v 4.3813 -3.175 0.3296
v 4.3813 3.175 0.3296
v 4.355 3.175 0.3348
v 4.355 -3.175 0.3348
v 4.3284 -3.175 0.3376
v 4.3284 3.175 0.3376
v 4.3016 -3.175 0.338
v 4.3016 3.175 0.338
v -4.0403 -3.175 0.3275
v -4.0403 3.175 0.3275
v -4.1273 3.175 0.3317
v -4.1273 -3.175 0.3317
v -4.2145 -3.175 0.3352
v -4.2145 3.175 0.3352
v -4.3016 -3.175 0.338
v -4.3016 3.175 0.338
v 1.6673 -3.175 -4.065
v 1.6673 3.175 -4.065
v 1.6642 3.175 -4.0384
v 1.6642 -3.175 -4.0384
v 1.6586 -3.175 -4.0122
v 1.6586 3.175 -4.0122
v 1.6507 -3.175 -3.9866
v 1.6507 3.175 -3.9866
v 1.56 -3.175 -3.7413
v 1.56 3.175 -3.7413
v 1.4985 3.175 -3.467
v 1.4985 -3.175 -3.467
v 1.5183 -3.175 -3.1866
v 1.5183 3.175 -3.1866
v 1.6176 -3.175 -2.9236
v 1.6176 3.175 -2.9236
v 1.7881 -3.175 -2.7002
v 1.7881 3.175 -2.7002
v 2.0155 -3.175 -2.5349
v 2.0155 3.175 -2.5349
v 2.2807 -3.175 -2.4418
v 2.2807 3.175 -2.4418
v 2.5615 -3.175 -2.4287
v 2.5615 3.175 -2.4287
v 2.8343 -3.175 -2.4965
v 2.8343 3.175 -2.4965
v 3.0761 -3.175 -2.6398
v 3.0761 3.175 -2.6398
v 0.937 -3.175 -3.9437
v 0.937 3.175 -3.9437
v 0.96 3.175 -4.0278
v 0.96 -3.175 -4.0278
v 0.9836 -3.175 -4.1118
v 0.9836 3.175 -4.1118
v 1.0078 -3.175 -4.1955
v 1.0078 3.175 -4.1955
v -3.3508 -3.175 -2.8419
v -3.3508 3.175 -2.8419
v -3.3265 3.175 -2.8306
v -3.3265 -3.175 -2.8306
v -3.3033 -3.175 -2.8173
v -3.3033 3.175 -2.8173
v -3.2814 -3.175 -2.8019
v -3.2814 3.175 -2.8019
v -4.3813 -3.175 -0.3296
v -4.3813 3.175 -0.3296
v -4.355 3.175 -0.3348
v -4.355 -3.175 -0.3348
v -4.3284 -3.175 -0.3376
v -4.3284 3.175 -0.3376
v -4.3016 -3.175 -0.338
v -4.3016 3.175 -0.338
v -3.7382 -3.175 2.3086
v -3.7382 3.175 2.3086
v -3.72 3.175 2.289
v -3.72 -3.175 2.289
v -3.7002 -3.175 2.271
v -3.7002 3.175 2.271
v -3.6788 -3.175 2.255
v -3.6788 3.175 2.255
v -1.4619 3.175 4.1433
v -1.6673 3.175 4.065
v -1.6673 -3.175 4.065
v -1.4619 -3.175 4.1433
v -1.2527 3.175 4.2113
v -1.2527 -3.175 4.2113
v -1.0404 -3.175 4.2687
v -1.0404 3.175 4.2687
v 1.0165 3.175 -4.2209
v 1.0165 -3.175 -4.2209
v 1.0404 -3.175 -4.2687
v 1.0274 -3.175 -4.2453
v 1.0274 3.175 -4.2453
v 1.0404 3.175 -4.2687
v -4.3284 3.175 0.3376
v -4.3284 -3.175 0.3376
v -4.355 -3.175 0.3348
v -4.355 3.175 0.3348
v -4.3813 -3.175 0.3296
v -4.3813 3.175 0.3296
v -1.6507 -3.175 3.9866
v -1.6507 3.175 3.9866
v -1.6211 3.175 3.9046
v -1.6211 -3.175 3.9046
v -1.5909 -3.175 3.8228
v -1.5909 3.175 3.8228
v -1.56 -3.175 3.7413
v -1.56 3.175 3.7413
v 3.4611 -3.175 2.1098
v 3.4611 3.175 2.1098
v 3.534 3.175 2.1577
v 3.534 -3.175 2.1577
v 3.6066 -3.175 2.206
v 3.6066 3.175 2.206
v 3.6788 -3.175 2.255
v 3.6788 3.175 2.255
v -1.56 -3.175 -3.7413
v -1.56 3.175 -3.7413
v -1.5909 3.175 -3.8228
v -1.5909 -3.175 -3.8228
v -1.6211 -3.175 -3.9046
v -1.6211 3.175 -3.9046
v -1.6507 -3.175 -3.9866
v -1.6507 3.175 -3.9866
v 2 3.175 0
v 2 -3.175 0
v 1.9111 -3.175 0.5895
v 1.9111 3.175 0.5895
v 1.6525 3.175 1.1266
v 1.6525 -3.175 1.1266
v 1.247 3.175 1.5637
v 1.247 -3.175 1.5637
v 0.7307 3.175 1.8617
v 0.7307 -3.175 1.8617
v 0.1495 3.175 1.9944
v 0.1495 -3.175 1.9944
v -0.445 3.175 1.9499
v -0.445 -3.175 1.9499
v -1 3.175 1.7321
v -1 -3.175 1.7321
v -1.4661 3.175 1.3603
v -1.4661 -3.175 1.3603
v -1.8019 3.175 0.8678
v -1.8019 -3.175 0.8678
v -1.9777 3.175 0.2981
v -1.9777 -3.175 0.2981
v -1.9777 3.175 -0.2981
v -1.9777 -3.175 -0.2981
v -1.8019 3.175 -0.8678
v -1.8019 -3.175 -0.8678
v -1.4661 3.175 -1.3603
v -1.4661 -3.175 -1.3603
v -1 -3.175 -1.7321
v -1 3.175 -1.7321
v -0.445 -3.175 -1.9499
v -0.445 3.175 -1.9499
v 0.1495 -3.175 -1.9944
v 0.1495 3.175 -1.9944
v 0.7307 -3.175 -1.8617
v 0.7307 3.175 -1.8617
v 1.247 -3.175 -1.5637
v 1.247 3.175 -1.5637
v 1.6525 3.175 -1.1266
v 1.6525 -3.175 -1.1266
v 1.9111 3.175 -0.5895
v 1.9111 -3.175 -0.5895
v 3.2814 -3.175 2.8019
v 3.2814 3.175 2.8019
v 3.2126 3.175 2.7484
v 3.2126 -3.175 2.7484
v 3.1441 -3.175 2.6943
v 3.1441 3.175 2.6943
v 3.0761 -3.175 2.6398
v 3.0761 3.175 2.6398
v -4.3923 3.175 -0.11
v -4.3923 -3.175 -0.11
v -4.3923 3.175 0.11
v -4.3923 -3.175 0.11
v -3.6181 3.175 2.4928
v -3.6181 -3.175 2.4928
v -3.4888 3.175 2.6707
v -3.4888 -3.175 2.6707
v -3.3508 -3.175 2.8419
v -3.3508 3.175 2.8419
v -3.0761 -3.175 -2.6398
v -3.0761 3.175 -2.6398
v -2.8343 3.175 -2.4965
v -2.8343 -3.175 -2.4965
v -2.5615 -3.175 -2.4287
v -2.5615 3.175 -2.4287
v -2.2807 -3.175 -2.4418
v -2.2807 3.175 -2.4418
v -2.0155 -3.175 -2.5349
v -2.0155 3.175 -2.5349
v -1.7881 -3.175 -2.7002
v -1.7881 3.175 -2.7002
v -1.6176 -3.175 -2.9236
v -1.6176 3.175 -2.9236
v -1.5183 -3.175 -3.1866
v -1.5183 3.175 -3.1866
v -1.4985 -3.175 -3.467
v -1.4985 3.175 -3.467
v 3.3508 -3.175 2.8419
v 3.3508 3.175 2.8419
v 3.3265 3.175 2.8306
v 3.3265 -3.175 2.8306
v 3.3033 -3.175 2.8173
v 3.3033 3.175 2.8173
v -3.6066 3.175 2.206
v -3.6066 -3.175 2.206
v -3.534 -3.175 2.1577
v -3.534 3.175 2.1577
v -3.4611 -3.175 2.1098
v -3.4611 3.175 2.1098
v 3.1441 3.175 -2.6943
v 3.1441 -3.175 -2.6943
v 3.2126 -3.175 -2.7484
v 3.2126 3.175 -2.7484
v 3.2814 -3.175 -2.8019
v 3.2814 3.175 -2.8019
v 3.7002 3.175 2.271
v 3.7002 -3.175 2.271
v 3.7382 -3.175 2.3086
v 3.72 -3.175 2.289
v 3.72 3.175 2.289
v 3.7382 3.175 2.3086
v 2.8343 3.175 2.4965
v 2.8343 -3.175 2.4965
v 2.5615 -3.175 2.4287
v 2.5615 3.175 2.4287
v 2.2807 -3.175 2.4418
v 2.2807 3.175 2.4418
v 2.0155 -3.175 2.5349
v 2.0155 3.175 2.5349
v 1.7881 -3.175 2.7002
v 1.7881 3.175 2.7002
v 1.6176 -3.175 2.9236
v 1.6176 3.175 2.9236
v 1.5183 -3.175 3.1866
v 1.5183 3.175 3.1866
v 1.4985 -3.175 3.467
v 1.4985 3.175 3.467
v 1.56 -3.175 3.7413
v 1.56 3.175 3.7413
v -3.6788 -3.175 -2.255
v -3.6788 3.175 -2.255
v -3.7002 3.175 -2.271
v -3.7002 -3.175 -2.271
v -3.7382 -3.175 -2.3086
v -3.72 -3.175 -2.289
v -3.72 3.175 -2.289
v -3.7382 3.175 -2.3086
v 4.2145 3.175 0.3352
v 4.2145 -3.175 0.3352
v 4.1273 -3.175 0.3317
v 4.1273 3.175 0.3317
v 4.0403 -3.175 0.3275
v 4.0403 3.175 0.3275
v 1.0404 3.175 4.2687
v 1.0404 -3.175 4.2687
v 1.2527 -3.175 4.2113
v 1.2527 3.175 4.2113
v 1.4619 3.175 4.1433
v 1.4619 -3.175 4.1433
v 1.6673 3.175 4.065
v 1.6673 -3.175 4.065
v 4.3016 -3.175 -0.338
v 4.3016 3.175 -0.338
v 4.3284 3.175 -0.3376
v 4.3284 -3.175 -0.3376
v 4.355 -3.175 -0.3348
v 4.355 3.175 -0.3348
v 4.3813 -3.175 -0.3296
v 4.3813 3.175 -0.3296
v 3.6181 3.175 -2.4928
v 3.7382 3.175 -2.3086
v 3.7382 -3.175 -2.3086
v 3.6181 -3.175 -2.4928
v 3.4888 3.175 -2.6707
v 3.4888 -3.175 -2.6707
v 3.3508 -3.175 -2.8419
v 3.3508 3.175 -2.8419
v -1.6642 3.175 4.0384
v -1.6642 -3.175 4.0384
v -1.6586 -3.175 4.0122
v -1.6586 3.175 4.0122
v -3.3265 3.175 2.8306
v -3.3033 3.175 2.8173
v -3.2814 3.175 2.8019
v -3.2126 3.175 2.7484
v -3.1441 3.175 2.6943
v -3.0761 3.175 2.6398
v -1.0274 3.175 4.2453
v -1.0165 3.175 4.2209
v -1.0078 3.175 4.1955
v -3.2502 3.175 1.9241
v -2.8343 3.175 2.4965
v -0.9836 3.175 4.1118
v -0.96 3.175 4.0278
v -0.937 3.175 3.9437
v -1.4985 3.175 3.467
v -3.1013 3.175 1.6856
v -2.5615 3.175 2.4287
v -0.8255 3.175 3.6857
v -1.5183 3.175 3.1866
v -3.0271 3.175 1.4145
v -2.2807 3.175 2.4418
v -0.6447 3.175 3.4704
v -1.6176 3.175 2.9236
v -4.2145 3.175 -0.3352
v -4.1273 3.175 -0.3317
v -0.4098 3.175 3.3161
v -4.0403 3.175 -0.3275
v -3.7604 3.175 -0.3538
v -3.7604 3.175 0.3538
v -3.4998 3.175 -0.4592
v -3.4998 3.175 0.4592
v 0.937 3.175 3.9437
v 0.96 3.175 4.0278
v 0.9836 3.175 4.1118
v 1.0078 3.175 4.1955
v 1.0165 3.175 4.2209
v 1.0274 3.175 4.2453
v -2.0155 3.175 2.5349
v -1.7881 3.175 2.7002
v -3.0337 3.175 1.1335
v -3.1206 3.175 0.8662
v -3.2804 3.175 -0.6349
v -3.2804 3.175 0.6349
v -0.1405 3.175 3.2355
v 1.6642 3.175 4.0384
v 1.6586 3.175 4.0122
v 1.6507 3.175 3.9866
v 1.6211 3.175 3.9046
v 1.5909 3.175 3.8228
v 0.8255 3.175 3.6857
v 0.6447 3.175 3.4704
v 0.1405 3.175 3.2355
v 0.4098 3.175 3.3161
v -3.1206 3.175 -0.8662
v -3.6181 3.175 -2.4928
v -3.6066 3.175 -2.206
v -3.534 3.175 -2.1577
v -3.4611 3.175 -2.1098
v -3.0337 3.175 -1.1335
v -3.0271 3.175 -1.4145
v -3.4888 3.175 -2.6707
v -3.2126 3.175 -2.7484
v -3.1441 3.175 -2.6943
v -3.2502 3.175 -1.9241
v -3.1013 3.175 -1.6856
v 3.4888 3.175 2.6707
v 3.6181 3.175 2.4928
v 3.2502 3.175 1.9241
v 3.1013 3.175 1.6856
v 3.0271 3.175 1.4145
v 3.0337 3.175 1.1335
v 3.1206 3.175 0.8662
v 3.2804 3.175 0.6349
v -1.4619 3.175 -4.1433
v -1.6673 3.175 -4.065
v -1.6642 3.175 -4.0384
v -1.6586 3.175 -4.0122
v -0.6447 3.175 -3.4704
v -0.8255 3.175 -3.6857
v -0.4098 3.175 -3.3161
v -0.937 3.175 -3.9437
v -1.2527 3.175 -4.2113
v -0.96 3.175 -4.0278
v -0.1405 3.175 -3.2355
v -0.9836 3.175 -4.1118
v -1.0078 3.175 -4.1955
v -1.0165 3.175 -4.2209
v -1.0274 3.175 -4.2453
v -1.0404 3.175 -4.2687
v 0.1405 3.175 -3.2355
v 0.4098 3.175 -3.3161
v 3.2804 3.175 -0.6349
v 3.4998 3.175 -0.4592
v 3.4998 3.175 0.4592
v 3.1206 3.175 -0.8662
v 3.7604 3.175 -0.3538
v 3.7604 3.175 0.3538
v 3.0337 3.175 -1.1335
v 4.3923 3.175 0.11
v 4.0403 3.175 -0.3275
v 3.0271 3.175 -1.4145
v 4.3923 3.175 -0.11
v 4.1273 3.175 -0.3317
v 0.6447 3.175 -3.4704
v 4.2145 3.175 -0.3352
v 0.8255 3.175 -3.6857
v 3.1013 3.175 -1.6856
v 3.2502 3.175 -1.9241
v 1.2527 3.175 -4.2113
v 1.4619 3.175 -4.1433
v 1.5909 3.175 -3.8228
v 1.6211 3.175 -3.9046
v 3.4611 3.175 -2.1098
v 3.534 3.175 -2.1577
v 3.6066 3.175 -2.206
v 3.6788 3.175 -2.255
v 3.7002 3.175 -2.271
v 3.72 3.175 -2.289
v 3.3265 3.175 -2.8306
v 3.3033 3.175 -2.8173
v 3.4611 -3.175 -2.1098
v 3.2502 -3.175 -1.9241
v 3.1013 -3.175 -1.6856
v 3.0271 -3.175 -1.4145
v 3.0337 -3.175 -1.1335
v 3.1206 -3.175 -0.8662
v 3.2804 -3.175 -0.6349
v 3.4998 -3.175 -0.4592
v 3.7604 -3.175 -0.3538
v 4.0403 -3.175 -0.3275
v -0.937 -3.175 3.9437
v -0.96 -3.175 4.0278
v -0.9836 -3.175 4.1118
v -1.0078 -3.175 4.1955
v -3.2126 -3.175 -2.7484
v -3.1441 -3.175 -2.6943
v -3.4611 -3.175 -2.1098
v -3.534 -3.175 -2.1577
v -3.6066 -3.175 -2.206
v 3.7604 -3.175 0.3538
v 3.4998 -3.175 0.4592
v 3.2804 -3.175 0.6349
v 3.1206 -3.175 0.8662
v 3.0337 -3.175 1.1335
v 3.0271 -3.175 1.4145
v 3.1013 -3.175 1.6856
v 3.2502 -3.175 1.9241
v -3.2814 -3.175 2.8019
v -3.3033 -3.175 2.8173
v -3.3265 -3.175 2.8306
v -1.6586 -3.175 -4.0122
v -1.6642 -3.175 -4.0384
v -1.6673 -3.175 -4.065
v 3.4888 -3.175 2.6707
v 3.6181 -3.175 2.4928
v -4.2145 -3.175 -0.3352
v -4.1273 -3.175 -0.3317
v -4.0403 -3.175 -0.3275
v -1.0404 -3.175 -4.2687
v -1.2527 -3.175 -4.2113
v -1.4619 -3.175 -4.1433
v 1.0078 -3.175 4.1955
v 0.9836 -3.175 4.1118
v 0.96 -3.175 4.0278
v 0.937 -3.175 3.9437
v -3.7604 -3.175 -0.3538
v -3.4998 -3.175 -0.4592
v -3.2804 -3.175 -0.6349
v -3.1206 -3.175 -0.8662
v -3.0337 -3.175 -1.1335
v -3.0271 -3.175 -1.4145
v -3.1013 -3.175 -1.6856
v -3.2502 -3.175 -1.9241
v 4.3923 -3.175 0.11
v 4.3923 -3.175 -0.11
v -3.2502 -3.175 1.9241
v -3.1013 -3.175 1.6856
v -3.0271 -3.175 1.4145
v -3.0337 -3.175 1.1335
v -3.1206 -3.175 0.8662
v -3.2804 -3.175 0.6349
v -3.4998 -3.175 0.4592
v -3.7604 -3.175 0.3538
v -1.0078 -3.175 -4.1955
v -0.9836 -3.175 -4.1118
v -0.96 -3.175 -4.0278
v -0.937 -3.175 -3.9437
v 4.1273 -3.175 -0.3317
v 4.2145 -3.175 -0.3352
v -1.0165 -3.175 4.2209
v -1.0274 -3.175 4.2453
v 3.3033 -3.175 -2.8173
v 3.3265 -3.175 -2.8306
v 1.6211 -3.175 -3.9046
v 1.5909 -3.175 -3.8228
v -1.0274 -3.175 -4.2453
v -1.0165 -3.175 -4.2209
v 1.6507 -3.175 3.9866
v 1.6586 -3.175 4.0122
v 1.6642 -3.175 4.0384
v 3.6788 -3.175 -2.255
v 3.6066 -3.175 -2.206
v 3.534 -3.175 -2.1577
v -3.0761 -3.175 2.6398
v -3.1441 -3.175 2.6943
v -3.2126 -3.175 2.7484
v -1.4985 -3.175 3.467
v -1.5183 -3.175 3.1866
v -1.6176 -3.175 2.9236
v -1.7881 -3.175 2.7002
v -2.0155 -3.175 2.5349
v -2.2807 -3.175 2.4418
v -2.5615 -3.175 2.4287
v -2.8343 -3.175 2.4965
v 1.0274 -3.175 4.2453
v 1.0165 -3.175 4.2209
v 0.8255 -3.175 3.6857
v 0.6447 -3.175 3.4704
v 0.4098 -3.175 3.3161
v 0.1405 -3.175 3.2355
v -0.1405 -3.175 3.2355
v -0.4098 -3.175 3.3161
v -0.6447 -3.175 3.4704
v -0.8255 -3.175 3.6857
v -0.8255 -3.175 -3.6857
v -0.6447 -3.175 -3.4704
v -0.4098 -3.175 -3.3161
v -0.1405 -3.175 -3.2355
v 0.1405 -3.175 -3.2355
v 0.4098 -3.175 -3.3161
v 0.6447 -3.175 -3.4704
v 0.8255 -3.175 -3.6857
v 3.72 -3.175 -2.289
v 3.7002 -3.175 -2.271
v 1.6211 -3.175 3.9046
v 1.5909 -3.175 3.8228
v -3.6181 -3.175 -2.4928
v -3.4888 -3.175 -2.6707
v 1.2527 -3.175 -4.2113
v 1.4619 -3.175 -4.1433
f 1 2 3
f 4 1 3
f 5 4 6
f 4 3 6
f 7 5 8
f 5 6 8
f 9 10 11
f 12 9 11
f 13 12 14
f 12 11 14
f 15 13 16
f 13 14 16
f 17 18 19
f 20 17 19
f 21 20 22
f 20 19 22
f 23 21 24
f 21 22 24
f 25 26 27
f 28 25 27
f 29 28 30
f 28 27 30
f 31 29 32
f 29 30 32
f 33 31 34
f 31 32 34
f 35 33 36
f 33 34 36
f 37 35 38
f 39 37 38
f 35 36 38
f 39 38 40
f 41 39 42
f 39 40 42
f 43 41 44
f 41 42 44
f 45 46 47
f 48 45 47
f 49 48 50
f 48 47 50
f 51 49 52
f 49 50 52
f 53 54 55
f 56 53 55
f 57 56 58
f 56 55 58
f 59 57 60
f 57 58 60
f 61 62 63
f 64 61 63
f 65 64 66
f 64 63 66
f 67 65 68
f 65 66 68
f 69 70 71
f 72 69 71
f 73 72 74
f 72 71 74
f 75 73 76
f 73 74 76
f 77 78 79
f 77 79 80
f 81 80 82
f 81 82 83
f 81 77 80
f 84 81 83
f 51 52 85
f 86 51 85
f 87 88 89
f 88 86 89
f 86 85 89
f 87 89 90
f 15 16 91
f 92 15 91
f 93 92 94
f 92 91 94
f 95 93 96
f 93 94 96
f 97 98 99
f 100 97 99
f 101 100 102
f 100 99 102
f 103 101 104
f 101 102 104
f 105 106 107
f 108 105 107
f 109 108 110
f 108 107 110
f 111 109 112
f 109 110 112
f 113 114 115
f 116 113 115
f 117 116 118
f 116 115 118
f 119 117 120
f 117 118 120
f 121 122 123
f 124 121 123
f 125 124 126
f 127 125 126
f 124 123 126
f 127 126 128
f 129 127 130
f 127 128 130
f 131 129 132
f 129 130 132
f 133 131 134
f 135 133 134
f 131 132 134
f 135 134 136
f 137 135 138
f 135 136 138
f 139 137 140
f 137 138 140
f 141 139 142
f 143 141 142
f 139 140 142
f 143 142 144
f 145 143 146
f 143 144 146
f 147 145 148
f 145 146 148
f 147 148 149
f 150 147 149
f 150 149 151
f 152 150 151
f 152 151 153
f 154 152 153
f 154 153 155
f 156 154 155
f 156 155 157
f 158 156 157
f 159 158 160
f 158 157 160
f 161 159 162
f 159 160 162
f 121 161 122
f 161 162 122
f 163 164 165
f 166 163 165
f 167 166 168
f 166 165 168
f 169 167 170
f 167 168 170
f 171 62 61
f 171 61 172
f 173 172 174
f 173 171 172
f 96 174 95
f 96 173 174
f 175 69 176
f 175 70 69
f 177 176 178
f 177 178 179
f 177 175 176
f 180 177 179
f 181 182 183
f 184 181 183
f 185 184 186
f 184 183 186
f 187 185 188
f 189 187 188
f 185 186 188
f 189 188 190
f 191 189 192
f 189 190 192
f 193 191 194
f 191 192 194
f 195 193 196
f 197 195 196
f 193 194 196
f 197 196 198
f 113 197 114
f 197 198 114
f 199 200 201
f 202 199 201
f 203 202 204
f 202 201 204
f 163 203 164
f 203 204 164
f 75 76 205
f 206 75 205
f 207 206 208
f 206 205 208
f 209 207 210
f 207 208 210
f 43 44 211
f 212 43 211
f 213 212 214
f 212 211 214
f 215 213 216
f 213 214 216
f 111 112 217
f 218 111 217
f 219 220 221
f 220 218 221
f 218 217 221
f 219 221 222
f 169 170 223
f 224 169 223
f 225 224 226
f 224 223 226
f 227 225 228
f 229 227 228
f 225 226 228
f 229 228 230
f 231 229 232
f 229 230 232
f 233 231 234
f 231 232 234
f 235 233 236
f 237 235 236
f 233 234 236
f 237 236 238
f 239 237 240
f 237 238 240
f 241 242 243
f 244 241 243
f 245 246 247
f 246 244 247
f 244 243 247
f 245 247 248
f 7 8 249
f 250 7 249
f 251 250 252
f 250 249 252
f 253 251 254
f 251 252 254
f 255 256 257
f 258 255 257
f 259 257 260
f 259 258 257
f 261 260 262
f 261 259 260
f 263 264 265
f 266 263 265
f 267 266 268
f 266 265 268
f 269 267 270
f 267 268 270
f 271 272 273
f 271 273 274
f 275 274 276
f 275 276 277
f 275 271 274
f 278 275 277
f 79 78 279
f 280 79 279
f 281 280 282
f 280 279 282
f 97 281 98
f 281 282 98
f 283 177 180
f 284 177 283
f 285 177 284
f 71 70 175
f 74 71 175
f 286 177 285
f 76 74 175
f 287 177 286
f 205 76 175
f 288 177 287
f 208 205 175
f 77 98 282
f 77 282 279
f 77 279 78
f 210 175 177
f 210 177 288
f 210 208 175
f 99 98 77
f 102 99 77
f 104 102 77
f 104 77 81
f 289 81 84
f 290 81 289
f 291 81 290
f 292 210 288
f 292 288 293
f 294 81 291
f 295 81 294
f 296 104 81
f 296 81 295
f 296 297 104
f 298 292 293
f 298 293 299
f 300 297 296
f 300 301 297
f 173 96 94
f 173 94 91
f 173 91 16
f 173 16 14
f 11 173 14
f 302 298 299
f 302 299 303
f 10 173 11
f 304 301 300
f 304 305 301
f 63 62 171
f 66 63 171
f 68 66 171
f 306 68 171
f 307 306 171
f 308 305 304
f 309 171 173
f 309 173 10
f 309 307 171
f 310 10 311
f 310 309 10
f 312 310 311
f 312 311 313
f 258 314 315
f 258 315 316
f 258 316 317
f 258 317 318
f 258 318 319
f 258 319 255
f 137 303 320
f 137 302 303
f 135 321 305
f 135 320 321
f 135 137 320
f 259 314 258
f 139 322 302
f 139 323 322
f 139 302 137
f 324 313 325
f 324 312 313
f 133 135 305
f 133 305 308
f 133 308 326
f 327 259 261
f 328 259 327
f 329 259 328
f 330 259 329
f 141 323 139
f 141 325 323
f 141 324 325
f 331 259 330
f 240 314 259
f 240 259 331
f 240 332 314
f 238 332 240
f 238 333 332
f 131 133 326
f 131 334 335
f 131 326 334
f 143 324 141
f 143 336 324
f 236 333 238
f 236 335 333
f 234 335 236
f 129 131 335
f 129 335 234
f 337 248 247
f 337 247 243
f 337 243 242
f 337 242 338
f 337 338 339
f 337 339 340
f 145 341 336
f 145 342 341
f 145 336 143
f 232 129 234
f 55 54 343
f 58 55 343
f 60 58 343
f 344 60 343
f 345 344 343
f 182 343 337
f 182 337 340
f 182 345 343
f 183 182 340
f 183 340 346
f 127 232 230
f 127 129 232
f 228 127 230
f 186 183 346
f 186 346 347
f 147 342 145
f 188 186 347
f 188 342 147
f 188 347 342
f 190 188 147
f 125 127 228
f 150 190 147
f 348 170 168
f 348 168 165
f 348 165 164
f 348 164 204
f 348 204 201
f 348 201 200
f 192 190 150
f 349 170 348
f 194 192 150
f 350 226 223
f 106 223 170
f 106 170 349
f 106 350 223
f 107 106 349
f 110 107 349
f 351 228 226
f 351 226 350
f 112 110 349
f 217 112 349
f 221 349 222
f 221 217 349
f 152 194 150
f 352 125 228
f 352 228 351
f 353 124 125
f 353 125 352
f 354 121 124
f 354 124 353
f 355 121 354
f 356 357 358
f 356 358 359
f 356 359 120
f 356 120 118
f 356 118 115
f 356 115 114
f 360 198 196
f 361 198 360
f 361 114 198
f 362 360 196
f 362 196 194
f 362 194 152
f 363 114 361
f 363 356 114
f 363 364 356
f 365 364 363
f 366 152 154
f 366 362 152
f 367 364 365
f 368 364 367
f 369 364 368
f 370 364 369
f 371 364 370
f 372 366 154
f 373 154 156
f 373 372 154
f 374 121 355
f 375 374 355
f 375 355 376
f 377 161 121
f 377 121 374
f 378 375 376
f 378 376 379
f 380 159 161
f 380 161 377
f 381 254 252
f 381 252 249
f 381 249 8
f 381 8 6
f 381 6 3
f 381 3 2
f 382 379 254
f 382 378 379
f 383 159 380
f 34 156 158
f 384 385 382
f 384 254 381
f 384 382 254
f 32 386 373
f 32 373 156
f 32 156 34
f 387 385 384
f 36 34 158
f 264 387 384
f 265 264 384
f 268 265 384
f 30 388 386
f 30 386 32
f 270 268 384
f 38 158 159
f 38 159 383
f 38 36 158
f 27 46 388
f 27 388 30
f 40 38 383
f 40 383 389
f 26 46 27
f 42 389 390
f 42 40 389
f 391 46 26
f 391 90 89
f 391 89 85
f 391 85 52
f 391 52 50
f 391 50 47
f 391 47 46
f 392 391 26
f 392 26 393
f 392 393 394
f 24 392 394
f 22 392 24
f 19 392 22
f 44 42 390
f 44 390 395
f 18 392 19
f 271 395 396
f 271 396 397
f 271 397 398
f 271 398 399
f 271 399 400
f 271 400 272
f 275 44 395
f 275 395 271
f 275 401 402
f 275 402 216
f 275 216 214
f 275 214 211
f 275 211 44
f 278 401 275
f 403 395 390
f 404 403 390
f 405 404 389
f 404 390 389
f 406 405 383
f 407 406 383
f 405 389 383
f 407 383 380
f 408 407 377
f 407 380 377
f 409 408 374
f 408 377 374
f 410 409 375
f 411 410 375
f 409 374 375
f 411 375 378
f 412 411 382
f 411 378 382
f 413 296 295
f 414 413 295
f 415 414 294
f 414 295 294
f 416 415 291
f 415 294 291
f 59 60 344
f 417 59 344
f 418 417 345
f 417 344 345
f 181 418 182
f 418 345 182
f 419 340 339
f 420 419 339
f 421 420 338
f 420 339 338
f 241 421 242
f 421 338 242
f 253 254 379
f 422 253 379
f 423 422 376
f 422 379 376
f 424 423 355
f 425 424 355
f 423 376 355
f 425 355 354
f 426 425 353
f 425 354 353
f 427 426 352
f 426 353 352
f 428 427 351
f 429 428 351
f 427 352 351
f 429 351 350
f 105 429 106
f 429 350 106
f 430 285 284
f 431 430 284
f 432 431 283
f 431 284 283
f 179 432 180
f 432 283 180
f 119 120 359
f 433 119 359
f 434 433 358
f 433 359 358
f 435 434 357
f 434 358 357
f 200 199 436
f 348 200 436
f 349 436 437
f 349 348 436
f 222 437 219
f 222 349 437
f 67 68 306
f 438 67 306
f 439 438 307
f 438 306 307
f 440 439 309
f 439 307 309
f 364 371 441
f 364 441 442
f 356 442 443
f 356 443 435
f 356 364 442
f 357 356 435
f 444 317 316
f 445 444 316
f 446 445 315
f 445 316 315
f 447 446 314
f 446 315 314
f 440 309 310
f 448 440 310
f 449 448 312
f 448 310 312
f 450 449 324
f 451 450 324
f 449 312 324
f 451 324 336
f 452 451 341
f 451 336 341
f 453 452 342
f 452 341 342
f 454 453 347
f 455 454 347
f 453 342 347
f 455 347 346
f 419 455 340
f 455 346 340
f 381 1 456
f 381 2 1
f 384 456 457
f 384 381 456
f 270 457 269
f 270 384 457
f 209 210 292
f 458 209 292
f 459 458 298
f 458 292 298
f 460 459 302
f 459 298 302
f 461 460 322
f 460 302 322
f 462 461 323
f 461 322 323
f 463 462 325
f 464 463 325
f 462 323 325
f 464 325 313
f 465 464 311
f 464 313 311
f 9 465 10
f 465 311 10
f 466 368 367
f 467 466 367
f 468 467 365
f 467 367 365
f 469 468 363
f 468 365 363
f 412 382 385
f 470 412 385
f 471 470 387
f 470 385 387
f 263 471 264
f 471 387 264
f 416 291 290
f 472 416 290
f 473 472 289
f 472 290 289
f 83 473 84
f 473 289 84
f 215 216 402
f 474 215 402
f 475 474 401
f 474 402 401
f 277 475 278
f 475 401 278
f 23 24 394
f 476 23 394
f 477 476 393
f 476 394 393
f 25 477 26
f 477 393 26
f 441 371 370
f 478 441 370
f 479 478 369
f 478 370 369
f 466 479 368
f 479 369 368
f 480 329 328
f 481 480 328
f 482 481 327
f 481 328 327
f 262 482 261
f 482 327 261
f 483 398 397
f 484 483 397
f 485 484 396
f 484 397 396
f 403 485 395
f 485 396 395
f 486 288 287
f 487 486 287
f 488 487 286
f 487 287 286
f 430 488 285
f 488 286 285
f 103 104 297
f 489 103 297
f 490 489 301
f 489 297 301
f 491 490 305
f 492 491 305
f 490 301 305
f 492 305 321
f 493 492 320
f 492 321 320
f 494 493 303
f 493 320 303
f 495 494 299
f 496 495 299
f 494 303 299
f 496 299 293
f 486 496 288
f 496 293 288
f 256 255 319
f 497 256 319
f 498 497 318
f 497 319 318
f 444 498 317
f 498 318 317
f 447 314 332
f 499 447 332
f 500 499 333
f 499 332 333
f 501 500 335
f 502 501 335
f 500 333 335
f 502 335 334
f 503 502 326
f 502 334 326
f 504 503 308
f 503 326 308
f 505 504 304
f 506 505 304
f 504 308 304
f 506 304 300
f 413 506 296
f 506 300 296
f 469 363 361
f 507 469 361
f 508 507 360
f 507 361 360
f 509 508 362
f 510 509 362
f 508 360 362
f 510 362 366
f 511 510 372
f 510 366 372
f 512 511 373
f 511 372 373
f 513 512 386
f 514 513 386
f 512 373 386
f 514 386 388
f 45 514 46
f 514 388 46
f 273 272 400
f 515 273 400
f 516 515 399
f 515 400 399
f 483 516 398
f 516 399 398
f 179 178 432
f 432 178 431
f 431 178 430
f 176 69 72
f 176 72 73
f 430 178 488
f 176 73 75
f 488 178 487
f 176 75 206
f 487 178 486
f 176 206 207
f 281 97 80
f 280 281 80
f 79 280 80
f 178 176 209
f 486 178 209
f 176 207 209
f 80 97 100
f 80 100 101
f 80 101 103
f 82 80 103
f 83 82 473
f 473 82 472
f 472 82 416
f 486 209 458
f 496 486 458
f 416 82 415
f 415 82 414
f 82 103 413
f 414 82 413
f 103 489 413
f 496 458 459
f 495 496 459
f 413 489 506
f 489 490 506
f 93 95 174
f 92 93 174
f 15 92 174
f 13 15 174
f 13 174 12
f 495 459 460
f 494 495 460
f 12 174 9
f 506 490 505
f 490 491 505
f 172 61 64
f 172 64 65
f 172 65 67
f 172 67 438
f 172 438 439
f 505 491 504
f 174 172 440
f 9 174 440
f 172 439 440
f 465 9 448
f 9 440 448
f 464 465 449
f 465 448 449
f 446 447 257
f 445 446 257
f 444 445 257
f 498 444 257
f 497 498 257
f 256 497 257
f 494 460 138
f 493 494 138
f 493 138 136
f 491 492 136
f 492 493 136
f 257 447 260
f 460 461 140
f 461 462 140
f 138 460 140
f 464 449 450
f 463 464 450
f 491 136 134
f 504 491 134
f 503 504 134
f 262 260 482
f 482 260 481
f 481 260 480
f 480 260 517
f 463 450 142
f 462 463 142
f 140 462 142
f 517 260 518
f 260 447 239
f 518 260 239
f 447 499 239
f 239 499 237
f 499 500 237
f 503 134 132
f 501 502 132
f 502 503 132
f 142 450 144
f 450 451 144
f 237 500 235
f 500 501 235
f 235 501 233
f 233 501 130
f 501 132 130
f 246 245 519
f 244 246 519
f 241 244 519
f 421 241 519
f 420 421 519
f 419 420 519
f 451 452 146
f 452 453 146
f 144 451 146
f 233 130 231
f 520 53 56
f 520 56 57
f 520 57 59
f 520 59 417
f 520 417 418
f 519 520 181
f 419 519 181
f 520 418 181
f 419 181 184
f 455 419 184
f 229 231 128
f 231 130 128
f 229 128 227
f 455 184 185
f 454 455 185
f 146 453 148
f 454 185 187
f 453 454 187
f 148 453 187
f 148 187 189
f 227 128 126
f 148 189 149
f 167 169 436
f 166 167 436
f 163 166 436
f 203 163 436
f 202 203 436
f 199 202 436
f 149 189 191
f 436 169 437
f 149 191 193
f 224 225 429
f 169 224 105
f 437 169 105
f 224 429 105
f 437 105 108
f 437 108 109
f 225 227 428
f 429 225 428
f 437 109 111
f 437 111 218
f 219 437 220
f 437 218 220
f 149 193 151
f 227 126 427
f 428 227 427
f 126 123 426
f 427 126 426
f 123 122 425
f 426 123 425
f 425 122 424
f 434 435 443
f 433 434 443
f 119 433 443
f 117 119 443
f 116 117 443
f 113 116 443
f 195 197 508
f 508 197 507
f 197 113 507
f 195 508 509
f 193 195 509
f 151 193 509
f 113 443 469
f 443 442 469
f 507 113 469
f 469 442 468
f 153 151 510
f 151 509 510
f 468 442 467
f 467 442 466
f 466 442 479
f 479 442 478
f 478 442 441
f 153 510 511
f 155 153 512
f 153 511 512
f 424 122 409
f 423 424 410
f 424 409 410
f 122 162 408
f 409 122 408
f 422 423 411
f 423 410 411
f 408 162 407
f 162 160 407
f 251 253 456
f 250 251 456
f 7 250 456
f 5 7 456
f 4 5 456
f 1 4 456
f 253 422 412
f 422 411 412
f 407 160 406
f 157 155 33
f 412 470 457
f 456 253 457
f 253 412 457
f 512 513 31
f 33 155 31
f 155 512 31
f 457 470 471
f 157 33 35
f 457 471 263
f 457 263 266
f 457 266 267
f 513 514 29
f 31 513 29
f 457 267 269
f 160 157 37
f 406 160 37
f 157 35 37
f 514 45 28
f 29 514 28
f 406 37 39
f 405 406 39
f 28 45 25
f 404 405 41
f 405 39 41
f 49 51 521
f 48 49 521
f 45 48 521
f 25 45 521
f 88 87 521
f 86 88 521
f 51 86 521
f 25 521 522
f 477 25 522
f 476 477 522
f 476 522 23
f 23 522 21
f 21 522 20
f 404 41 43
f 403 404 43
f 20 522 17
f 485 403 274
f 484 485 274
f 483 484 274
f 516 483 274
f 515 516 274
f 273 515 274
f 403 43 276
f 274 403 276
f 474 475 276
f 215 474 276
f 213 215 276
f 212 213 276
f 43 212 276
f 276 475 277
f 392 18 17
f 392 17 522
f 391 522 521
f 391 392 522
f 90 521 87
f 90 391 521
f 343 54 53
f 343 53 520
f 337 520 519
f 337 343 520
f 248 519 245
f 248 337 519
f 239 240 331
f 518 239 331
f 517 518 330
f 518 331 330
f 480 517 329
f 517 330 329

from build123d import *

# Parameters (mm, degrees)
SKETCH1_R          = 4.393648446
TOOTHOD_DEPTH      = 3.4925
TOOTHPROFILE_DEPTH = 8.127822218
TOOTHPATTERN_COUNT = 10
BORE_DEPTH         = 10.035238042
BORE_DEPTH_BACK    = 10.035238042
SKETCH7_R          = 2
CUT_EXTRUDE1_START = 3.175
SKETCH11_R         = 5.536648446
CUT_EXTRUDE1_DEPTH = 6.860238042
CUT_EXTRUDE2_START = -3.175
SKETCH11_2_R       = 5.536648446
CUT_EXTRUDE2_DEPTH = 6.860238042


with BuildPart() as part:
    # Sketch1 → ToothOD (new, symmetric)
    with BuildSketch(Plane(origin=(0, 0, 0), x_dir=(1, 0, 0), z_dir=(0, 1, 0))):
        Circle(SKETCH1_R)
    extrude(amount=TOOTHOD_DEPTH, both=True)

    # Sketch2 → ToothProfile (cut, symmetric)
    with BuildSketch(Plane(origin=(0, 0, 0), x_dir=(1, 0, 0), z_dir=(0, 1, 0))):
        with BuildLine():
            ThreePointArc((-0.937033068, 3.943710441), (-0.590385173, 3.425535831), (0, 3.225248446))
            ThreePointArc((0, 3.225248446), (0.590385173, 3.425535831), (0.937033068, 3.943710441))
            ThreePointArc((0.937033068, 3.943710441), (0.971699064, 4.069821903), (1.007805813, 4.195528446))
            ThreePointArc((1.007805813, 4.195528446), (1.021661234, 4.233200647), (1.040426249, 4.268683624))
            ThreePointArc((1.040426249, 4.268683624), (0, 4.393648446), (-1.040426249, 4.268683624))
            ThreePointArc((-1.040426249, 4.268683624), (-1.021661234, 4.233200647), (-1.007805813, 4.195528446))
            ThreePointArc((-1.007805813, 4.195528446), (-0.971699064, 4.069821903), (-0.937033068, 3.943710441))
        make_face()
    toothprofile = extrude(amount=TOOTHPROFILE_DEPTH, both=True, mode=Mode.SUBTRACT)

    # ToothPattern: ToothProfile ×10 about axis
    toothpattern_axis = Axis((0, 3.4925, 0), (0, -1, 0))
    for i in range(1, TOOTHPATTERN_COUNT):
        add(toothprofile.rotate(toothpattern_axis, i * 360 / TOOTHPATTERN_COUNT), mode=Mode.SUBTRACT)

    # Sketch4 → Flange (revolve)
    with BuildSketch(Plane.XY):
        with BuildLine():
            Line((0, -3.4925), (4.647648446, -3.4925))
            ThreePointArc((4.647648446, -3.4925), (4.839929254, -3.531494589), (5.028648446, -3.585137424))
            ThreePointArc((5.028648446, -3.585137424), (5.304690043, -3.90309066), (5.536648446, -4.2545))
            Line((5.536648446, -4.2545), (5.536648446, -4.5085))
            Line((5.536648446, -4.5085), (0, -4.5085))
            Line((0, -4.5085), (0, -3.4925))
        make_face()
        with BuildLine():
            Line((5.536648446, 4.5085), (5.536648446, 4.2545))
            ThreePointArc((5.536648446, 4.2545), (5.304690043, 3.90309066), (5.028648446, 3.585137424))
            ThreePointArc((5.028648446, 3.585137424), (4.839929254, 3.531494589), (4.647648446, 3.4925))
            Line((4.647648446, 3.4925), (0, 3.4925))
            Line((0, 3.4925), (0, 4.5085))
            Line((0, 4.5085), (5.536648446, 4.5085))
        make_face()
    revolve(axis=Axis((0, 8.73125, 0), (0, -1, 0)))

    # Sketch7 → Bore (cut, two sides: drawn at the far end of the back side and taken through both)
    with BuildSketch(Plane.XZ.offset(-BORE_DEPTH_BACK)):
        Circle(SKETCH7_R)
    extrude(amount=BORE_DEPTH + BORE_DEPTH_BACK, mode=Mode.SUBTRACT)

    # Sketch11 → Cut-Extrude1 (cut, through all)
    with BuildSketch(Plane(origin=(0, 0, 0), x_dir=(1, 0, 0), z_dir=(0, 1, 0)).offset(CUT_EXTRUDE1_START)):
        Circle(SKETCH11_R)
    extrude(amount=CUT_EXTRUDE1_DEPTH, mode=Mode.SUBTRACT)

    # Sketch11_2 → Cut-Extrude2 (cut, through all)
    with BuildSketch(Plane(origin=(0, 0, 0), x_dir=(1, 0, 0), z_dir=(0, 1, 0)).offset(CUT_EXTRUDE2_START)):
        Circle(SKETCH11_2_R)
    extrude(amount=-CUT_EXTRUDE2_DEPTH, mode=Mode.SUBTRACT)


solid = part.part
